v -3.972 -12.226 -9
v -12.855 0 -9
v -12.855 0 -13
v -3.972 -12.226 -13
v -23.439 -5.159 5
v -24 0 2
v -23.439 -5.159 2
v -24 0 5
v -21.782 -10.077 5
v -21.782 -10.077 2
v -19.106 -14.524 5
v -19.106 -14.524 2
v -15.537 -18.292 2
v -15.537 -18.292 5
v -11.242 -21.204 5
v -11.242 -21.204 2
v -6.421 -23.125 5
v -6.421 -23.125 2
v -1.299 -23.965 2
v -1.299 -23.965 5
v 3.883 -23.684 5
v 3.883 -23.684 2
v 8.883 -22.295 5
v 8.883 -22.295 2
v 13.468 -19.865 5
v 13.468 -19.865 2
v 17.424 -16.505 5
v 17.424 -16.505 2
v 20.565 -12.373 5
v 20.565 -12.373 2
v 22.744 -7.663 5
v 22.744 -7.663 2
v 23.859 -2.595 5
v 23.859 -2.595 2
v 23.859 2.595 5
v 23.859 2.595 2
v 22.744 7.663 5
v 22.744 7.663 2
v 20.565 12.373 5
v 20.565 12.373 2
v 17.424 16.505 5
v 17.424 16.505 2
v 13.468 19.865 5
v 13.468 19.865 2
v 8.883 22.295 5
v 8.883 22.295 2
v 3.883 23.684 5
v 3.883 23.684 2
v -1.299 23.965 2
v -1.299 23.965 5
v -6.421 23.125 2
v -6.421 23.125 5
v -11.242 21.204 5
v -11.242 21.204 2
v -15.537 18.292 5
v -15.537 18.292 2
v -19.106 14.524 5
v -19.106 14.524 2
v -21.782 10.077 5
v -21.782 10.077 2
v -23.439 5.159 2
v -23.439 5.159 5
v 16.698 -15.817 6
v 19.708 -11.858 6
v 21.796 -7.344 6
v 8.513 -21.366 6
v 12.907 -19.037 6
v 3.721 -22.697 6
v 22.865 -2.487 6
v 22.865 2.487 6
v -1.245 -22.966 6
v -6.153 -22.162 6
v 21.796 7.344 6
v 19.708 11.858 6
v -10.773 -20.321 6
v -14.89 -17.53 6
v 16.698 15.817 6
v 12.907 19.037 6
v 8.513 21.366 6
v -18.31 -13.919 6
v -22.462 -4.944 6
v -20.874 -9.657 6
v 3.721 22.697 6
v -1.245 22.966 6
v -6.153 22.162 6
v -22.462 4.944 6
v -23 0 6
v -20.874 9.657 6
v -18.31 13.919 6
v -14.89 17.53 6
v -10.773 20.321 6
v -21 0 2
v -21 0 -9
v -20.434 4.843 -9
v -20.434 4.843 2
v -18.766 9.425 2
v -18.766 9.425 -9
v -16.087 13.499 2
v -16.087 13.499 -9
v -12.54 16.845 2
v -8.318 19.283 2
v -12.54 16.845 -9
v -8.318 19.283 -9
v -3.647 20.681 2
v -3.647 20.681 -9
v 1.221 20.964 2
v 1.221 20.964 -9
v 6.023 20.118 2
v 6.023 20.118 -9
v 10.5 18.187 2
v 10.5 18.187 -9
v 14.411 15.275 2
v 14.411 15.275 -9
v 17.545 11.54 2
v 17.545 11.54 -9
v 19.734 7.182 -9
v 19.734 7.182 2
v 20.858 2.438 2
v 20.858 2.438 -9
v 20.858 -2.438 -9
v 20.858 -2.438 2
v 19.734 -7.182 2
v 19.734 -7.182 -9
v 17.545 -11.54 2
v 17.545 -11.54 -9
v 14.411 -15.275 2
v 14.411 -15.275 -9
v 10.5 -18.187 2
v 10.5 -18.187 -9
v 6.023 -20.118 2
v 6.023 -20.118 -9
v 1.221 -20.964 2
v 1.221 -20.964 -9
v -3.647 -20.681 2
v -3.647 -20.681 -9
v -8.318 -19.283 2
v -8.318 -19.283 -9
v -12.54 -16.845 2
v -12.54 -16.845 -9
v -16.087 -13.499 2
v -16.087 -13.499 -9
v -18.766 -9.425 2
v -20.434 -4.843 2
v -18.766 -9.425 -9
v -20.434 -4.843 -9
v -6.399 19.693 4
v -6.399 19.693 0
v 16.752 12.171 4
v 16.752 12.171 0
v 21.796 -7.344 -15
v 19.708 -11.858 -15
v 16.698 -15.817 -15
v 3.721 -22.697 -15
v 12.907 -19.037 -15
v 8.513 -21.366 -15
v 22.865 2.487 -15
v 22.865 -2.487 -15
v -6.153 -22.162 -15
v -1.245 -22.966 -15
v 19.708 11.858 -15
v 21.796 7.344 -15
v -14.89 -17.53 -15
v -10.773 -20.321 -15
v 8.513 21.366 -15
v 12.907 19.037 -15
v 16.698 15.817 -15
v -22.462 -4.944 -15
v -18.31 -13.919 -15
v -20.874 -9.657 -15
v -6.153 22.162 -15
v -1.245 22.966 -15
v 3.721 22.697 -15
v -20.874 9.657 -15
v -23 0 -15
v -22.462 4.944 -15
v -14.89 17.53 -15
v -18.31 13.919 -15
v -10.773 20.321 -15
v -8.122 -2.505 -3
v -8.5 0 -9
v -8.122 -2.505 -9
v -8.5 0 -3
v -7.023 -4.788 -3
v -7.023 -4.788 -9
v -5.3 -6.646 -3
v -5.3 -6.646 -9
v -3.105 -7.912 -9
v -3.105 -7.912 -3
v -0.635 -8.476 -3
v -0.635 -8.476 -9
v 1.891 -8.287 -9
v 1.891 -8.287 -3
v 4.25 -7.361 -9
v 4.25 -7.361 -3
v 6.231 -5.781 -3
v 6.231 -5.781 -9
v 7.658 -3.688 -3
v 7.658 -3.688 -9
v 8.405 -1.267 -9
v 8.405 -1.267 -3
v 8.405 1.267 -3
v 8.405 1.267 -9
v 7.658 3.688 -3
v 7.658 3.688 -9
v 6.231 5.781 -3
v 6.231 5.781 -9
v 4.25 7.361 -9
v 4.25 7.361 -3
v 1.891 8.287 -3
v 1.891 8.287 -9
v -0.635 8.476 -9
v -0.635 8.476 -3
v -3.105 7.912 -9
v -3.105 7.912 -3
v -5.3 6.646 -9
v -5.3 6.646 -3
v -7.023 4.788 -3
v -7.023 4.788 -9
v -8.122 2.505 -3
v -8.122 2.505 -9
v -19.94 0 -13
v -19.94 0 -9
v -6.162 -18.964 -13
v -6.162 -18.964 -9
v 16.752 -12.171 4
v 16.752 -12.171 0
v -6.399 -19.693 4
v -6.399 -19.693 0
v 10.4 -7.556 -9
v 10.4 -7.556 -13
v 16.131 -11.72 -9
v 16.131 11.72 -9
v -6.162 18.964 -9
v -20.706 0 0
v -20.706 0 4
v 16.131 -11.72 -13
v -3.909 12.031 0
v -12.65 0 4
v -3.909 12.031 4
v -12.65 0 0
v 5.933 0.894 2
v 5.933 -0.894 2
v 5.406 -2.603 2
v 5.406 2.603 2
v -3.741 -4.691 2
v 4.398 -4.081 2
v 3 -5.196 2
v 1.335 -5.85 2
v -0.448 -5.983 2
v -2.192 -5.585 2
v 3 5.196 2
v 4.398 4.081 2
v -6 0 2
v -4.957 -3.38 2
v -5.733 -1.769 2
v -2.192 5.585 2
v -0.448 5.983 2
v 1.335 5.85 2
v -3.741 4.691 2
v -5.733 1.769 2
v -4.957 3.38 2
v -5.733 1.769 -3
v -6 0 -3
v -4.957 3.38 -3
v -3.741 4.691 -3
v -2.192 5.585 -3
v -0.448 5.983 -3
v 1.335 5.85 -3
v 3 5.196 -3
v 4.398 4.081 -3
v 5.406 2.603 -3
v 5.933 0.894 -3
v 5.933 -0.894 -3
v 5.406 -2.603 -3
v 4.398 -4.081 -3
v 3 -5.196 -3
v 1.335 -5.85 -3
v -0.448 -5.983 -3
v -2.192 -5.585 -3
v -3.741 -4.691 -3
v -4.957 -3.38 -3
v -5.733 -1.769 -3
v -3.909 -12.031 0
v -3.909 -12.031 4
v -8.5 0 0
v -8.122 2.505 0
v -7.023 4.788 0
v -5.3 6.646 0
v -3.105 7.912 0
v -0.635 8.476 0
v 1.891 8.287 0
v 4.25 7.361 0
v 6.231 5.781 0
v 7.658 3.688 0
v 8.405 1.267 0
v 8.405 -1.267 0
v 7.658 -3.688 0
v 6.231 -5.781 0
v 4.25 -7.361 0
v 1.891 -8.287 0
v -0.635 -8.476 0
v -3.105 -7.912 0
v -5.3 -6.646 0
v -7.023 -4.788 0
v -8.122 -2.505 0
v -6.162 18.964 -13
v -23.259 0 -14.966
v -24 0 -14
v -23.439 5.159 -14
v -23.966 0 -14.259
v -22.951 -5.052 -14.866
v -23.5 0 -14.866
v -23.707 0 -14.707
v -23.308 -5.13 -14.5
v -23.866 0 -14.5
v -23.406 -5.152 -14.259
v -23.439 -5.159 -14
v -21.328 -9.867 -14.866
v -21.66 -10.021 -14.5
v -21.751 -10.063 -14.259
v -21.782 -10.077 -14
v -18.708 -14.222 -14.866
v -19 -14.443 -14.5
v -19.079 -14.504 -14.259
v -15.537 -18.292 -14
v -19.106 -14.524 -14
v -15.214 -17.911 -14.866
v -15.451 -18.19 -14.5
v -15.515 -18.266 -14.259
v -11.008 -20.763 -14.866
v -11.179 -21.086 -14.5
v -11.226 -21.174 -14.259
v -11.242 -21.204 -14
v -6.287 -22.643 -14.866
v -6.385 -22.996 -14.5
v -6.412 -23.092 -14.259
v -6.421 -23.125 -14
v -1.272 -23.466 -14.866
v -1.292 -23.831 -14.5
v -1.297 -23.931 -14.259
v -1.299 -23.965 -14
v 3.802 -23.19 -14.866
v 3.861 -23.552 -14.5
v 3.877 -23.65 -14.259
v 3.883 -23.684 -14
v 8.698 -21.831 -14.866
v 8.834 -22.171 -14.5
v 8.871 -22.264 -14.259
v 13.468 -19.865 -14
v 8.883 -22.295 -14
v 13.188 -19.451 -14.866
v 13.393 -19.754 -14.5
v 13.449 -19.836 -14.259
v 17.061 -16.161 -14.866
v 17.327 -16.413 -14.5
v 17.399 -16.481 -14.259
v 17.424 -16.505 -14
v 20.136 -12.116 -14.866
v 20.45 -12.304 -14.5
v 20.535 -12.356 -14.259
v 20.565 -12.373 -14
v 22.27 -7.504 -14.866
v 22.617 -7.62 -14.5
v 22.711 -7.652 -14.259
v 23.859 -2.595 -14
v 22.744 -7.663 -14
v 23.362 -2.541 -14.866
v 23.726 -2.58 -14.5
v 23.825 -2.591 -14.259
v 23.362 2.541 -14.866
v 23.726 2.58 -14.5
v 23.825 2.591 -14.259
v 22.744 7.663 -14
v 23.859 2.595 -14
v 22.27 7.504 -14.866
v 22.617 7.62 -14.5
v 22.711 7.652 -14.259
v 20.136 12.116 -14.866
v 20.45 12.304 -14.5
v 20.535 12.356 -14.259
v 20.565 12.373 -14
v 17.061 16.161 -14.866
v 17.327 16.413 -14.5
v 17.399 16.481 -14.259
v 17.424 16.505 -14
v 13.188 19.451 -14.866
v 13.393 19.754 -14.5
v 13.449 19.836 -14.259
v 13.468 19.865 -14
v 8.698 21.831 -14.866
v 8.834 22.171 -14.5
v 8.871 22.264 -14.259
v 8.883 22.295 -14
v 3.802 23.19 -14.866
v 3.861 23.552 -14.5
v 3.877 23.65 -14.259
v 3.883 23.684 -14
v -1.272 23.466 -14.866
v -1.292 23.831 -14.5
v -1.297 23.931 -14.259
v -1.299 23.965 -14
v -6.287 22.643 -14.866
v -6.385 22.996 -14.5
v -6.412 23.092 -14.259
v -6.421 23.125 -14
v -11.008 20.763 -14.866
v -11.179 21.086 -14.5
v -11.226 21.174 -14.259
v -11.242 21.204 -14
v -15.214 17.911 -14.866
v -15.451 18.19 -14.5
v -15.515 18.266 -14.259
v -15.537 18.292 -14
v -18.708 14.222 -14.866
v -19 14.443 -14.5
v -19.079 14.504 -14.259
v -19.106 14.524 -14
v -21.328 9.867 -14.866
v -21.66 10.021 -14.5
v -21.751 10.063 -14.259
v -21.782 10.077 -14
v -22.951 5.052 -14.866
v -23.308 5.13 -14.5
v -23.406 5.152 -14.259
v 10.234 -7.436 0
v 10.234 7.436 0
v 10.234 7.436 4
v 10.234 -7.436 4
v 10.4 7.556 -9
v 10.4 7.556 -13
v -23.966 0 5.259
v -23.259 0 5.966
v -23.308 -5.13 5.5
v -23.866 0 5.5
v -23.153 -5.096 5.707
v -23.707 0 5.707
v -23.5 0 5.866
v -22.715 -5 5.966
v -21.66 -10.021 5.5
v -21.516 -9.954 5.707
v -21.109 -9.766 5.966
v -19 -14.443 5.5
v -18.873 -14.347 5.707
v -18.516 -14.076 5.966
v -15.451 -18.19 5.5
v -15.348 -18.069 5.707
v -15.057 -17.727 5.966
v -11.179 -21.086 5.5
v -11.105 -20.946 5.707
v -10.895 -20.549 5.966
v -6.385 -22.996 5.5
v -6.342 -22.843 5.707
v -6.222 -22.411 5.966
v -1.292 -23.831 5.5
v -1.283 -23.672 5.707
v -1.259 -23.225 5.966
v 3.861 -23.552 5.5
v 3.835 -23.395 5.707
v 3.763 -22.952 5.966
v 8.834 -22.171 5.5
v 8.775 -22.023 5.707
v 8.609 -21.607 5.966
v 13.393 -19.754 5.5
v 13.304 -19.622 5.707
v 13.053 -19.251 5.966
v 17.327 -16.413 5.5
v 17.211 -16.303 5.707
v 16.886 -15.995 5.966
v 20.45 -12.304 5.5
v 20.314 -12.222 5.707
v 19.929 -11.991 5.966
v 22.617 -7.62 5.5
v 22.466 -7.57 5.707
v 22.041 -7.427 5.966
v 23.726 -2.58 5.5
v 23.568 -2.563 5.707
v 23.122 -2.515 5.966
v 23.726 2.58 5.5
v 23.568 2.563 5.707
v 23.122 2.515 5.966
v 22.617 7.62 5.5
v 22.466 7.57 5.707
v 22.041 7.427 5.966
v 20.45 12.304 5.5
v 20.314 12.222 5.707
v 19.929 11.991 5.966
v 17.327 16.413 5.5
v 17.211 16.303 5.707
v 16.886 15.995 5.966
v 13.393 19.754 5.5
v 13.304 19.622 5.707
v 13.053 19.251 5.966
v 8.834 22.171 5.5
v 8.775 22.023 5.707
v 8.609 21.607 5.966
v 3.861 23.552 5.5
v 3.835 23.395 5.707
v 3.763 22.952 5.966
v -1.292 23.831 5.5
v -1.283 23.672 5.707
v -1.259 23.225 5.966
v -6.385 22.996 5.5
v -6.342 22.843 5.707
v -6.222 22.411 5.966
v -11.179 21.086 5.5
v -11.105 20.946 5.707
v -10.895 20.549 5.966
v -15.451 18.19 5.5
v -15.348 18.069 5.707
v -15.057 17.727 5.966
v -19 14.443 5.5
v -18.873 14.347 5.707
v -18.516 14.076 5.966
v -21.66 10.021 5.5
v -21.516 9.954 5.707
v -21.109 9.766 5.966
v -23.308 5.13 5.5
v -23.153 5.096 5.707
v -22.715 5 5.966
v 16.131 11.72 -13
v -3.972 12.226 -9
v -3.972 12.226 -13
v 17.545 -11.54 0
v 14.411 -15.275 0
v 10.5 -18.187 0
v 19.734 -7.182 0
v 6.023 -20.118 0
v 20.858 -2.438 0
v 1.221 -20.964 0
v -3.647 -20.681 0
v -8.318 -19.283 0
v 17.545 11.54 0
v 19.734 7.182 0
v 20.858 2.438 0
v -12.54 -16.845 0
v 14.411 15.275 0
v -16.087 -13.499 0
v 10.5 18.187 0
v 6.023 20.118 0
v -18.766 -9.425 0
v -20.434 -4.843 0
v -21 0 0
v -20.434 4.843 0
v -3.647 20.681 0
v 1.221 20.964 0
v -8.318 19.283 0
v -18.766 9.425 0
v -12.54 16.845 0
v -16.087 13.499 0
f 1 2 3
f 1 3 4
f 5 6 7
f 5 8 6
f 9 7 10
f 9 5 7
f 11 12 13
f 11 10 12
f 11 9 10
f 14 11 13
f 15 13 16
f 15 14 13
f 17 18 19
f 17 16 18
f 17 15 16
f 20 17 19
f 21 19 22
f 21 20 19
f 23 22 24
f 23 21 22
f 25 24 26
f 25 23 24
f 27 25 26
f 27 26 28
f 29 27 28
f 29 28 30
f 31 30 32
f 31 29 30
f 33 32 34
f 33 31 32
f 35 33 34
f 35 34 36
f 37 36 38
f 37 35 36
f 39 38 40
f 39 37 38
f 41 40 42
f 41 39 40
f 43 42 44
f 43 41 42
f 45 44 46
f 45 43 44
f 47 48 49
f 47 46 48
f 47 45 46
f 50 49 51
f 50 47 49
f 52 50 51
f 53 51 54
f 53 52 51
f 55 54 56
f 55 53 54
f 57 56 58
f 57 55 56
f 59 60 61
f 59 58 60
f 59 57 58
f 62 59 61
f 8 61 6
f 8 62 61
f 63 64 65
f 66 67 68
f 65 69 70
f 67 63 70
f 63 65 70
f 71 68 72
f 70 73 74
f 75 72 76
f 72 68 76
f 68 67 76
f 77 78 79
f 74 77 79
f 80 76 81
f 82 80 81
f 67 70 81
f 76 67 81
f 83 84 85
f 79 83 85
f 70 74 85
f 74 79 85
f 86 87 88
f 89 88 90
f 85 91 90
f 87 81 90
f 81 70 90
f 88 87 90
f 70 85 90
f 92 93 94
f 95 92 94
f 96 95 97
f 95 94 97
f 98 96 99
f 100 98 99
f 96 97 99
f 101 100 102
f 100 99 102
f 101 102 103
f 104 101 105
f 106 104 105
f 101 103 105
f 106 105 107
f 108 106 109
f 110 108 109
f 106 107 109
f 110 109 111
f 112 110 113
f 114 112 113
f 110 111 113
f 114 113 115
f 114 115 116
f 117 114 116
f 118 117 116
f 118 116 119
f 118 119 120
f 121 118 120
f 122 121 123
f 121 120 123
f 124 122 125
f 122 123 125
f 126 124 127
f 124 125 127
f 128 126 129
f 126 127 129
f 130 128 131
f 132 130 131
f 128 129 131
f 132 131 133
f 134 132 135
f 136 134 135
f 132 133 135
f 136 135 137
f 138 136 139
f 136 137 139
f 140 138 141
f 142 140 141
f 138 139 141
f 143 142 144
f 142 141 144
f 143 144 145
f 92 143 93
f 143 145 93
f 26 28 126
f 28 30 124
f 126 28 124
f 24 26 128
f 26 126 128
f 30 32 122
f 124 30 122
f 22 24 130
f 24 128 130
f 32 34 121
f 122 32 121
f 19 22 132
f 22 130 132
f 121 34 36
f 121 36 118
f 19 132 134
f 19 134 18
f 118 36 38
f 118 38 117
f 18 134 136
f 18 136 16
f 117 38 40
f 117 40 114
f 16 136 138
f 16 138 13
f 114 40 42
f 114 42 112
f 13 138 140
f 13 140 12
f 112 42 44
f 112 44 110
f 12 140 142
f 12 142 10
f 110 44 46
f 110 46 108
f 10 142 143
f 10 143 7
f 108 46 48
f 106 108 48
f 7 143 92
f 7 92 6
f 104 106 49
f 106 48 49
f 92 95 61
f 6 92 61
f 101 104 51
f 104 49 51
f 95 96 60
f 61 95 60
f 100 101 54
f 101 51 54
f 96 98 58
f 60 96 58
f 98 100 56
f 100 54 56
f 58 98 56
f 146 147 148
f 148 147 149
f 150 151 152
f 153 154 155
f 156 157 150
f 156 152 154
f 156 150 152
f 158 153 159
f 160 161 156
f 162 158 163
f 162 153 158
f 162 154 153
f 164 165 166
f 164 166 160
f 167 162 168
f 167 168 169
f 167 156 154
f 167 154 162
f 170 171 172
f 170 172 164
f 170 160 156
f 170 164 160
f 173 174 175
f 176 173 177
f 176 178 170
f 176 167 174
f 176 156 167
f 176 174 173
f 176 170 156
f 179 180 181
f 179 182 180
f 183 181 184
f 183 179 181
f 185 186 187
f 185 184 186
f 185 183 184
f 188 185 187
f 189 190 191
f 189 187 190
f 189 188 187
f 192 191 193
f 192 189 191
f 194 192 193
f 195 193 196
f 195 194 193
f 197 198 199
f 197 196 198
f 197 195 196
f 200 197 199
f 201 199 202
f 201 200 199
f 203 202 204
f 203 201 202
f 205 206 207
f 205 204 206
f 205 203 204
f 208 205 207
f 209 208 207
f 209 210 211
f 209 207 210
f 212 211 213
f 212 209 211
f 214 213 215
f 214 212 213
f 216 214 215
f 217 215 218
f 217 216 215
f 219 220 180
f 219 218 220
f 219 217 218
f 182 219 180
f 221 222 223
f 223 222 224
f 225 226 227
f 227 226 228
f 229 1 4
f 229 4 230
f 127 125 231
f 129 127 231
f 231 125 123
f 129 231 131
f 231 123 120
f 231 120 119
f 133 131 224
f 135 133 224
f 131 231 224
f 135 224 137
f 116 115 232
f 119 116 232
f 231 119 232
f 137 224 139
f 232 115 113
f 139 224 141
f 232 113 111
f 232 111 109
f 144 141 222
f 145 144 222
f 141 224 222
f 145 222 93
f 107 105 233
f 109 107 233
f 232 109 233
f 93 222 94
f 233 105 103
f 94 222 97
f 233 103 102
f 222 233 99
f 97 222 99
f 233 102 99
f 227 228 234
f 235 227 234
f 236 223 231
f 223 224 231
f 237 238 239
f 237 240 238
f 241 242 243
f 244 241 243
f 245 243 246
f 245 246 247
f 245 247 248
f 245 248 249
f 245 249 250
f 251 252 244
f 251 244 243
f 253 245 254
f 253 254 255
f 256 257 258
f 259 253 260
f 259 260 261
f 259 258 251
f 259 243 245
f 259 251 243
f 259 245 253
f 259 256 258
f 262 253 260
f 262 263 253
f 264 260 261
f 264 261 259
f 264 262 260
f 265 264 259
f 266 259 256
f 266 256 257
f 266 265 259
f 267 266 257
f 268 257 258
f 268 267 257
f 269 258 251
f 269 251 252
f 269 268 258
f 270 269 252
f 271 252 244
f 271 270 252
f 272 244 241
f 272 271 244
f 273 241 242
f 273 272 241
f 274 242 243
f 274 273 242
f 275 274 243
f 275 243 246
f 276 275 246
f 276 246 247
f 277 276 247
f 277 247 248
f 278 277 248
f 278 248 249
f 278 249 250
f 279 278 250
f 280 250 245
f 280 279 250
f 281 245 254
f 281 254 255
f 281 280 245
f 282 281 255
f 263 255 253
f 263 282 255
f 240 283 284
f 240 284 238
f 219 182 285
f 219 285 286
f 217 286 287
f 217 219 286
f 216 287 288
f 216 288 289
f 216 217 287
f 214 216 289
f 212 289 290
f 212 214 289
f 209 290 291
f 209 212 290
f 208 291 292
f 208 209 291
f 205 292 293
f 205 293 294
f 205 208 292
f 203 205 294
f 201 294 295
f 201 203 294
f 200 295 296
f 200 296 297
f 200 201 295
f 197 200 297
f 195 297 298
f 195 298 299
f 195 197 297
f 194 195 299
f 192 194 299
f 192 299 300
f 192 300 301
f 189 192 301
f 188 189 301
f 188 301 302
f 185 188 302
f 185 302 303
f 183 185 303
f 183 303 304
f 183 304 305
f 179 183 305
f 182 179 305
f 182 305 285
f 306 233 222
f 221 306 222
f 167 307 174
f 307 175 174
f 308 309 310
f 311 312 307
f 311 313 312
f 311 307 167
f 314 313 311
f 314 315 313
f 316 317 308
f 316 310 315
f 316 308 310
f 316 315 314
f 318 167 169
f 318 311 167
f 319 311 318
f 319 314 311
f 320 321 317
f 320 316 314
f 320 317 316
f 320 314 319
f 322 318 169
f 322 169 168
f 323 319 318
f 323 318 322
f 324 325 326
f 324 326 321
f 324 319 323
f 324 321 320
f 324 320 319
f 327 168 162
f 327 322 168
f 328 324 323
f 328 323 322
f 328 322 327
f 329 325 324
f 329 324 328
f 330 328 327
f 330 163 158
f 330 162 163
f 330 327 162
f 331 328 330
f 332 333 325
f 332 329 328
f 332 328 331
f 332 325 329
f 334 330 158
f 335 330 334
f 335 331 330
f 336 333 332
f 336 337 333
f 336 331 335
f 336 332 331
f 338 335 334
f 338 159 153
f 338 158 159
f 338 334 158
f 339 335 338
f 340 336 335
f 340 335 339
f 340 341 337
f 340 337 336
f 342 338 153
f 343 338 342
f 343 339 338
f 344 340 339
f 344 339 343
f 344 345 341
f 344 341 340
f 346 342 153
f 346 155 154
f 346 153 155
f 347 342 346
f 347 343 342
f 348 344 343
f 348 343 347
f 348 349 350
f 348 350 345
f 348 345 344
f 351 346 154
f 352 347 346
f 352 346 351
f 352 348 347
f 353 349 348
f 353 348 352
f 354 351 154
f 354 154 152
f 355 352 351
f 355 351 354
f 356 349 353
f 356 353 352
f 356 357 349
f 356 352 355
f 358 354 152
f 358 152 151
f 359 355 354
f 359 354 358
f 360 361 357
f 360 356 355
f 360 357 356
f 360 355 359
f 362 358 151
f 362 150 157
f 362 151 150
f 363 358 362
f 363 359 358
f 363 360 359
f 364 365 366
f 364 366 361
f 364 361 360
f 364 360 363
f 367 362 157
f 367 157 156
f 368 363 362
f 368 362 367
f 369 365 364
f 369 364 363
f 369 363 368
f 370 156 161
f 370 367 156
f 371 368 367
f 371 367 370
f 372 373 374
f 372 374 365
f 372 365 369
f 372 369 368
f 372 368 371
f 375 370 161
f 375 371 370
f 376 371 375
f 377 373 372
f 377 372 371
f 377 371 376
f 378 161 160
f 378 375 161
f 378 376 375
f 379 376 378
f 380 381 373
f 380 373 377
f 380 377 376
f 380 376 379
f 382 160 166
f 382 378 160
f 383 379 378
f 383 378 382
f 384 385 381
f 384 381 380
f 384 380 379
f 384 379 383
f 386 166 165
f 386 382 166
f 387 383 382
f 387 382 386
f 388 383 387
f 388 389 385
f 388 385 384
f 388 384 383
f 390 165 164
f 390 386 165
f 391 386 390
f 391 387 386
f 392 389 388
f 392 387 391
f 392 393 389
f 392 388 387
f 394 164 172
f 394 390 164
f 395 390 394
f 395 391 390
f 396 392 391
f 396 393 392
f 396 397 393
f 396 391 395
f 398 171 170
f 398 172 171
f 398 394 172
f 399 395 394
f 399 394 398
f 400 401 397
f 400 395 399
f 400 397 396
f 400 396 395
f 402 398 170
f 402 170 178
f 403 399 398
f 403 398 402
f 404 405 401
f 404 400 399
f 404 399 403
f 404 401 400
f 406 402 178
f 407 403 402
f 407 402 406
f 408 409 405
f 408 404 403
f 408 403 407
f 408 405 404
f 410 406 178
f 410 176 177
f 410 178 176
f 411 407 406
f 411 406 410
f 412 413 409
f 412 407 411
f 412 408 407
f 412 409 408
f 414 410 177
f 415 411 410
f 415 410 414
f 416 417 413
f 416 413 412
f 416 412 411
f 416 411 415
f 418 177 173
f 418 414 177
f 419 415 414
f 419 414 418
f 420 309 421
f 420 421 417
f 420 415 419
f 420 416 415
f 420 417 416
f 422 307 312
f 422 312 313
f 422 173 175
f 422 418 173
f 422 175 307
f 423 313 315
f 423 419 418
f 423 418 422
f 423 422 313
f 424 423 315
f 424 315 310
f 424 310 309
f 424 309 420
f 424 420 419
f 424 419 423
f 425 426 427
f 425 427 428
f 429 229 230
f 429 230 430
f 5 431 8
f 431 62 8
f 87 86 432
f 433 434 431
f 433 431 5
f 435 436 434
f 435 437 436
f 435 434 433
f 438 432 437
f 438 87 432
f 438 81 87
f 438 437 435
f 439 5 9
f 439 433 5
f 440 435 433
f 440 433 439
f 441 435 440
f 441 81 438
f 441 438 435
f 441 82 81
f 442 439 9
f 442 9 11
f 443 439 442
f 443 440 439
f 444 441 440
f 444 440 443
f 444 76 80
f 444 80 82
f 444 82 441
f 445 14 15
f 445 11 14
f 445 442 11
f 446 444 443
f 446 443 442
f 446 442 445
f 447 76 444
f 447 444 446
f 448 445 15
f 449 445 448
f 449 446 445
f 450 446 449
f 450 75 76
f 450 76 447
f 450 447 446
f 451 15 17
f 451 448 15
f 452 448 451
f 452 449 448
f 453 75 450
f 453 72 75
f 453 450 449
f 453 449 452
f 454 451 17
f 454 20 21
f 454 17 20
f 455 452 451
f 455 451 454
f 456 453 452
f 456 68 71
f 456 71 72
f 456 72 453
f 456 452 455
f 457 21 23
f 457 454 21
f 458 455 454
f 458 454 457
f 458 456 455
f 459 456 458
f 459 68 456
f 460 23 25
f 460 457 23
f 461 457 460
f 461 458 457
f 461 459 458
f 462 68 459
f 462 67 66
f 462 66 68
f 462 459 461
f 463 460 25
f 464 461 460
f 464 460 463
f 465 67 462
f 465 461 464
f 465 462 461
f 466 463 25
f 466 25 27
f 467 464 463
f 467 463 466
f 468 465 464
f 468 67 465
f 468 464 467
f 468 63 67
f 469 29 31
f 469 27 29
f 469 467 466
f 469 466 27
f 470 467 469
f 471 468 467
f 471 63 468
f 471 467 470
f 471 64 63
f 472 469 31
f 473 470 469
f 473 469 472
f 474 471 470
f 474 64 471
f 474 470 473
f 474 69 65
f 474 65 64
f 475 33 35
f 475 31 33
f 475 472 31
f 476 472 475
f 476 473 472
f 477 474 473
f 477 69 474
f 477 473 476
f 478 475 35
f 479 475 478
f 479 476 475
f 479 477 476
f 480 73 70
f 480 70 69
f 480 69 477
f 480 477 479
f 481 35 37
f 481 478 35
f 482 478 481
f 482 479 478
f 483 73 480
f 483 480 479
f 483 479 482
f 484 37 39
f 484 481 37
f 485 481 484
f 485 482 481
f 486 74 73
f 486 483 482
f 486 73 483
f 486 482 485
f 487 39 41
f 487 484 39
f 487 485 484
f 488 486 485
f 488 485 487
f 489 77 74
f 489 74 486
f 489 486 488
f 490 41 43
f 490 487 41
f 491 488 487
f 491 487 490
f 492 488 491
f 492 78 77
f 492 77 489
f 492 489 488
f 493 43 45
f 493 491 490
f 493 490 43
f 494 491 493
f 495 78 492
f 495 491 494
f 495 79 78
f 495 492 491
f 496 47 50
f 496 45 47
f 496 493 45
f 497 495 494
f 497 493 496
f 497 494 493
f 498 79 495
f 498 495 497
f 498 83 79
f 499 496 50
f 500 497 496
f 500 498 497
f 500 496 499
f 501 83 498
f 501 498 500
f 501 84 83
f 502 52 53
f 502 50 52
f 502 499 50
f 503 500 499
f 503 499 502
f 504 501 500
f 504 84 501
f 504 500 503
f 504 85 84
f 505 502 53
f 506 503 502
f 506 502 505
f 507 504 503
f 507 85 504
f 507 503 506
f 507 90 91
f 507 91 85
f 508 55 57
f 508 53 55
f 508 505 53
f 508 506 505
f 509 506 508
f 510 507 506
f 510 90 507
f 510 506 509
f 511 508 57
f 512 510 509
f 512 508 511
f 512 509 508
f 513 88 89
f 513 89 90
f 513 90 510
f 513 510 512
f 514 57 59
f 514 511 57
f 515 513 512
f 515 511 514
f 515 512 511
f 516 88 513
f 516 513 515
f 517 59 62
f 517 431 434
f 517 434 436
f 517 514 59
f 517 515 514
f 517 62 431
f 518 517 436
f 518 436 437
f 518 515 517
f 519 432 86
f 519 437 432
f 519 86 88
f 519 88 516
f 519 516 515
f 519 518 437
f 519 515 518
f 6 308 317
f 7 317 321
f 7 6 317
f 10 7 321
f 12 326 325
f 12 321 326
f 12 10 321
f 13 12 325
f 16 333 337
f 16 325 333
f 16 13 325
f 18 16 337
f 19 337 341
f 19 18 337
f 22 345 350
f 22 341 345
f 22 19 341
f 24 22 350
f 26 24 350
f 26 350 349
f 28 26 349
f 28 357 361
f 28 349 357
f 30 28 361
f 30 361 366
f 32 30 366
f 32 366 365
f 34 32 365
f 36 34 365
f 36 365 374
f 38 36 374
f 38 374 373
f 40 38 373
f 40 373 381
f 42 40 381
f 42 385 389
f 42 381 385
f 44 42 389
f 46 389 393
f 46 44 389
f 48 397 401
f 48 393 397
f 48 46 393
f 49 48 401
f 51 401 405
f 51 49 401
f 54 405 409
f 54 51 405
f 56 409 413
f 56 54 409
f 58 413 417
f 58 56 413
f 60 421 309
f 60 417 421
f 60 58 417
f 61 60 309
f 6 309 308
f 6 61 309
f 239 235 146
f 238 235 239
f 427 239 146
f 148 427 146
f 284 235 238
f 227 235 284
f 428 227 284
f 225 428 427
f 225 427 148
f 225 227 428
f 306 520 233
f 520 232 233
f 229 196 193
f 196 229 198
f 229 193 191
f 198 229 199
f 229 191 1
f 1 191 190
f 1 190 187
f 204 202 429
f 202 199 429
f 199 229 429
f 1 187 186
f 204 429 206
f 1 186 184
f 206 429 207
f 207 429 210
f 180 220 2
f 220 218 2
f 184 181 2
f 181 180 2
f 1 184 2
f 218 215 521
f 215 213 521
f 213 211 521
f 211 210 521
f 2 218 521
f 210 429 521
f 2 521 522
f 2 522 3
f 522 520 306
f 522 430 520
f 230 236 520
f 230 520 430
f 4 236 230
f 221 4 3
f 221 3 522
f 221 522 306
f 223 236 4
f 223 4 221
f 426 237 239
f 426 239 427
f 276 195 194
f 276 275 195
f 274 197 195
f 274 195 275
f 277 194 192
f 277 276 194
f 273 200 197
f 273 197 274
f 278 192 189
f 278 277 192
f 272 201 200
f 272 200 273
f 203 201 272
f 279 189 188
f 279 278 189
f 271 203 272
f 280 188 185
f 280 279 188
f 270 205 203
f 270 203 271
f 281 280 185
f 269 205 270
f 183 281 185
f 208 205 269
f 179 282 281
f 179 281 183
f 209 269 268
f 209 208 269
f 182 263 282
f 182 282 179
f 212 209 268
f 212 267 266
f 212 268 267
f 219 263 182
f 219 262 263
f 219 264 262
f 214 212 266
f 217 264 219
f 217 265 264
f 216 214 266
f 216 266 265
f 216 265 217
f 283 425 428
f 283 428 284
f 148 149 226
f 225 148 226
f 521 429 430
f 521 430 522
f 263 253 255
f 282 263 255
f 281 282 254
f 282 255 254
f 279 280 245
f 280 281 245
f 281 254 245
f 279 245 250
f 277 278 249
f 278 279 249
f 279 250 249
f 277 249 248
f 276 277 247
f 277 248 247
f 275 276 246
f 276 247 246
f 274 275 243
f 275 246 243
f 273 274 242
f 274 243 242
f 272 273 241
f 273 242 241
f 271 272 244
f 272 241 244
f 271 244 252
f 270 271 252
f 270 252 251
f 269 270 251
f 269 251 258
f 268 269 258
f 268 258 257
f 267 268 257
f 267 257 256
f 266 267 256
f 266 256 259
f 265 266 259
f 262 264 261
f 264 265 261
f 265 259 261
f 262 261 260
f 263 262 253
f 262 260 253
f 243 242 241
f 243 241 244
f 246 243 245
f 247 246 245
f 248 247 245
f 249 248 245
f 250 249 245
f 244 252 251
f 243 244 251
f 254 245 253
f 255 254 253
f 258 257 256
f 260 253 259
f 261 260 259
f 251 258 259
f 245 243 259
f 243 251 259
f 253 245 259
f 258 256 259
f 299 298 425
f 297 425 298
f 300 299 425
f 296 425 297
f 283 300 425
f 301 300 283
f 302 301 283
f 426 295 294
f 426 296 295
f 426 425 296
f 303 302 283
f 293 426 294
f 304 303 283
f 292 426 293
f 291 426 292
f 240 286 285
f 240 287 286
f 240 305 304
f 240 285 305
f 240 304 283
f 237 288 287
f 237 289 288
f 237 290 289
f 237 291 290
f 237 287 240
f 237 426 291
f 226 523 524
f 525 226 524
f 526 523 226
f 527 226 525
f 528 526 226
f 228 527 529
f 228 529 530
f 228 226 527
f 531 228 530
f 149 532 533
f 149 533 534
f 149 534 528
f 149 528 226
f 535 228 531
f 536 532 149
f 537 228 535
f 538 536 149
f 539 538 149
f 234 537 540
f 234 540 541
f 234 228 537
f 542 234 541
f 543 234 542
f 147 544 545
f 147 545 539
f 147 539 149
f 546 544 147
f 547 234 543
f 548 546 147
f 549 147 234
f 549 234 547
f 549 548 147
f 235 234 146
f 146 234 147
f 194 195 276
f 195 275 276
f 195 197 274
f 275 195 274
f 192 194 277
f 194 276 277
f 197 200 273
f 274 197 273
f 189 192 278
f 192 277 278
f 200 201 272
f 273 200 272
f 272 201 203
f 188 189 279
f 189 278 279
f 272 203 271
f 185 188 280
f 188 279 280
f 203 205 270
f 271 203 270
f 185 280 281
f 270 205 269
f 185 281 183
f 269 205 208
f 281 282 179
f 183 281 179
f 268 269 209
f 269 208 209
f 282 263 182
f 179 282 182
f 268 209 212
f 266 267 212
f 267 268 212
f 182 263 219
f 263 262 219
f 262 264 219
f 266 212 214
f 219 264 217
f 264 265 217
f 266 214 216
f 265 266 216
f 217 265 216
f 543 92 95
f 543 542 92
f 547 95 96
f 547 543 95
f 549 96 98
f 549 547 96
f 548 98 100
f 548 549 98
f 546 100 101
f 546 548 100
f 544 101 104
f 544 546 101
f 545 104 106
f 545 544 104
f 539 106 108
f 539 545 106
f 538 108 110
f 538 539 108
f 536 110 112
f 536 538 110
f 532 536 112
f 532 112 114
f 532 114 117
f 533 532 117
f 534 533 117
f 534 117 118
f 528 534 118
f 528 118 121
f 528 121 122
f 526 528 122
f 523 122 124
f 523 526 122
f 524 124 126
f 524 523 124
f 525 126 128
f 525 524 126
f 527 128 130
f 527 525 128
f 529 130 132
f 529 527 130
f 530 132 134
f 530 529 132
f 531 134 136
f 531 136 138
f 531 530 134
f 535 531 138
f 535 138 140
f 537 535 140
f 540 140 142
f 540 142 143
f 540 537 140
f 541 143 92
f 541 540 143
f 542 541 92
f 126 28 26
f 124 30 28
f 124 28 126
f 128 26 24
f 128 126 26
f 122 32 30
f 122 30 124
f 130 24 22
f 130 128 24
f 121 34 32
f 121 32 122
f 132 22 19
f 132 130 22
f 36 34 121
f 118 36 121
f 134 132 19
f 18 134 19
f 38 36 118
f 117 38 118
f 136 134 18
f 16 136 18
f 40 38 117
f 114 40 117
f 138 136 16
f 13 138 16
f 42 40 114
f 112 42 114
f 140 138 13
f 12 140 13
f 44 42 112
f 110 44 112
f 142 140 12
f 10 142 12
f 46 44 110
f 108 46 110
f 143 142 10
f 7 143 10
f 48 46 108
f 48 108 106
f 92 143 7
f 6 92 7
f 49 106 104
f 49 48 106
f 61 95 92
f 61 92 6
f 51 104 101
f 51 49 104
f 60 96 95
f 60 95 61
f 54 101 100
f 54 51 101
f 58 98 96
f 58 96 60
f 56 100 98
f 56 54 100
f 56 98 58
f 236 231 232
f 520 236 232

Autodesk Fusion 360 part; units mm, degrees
sketch "Sketch1" plane through (0, 0, 0) normal (0, 1, 0) x (1, 0, 0)
  line L0 (0, -45) -> (0, 23.1854)
  line L1 (0, 15) -> (-23, 15)
  line L2 (-24, 14) -> (-24, -2)
  line L3 (0, -2) -> (0, 15)
  arc A0 (-23, 15) -> (-24, 14) centre (-23, 14) ccw
  line L4 (-21, 9) -> (-8.5, 9)
  line L5 (-8.5, 9) -> (-8.5, 3)
  line L6 (-21, 0) -> (-21, 9)
  line L7 (-21, 0) -> (-21, -2)
  line L8 (-24, -2) -> (-21, -2)
  line L9 (-6, 3) -> (-8.5, 3)
  line L10 (0, -2) -> (-6, -2)
  line L11 (-6, -2) -> (-6, 3)
  line L12 (0, 3) -> (0, -2)
  dimension "d2" = 17
  dimension "d3" = 1
  dimension "d4" = 12.5
  dimension "d5" = 9
revolve "Revolve1" add sketch "Sketch1" angle 360 about axis through (0, 0, 45) along (0, 0, -1) makes body 1
sketch "Sketch2" plane through (0, 0, -9) normal (0, 0, 1) x (-1, 0, 0)
  circle A0 centre (0, 0) radius 8.5
  circle A1 centre (0, 0) radius 21
  line L0 (19.9396, 0) -> (6.1617, 18.9637)
  line L1 (6.1617, 18.9637) -> (-16.1315, 11.7202)
  line L2 (-16.1315, 11.7202) -> (-16.1315, -11.7202)
  line L3 (-16.1315, -11.7202) -> (6.1617, -18.9637)
  line L4 (6.1617, -18.9637) -> (19.9396, 0)
  line L5 (12.8552, 0) -> (3.9725, 12.2261)
  line L6 (3.9725, 12.2261) -> (-10.4001, 7.5561)
  line L7 (-10.4001, 7.5561) -> (-10.4001, -7.5561)
  line L8 (-10.4001, -7.5561) -> (3.9725, -12.2261)
  line L9 (3.9725, -12.2261) -> (12.8552, 0)
extrude "Extrude1" cut sketch "Sketch2" against normal blind 4 contours L0 L1 L2 L3 L4 bodies 1
copy_body "Body->Comp1" bodies 1 removing the originals makes body 2 in component "Component"
sketch "Sketch1 (2)" plane through (0, 0, 0) normal (0, 1, 0) x (1, 0, 0) in component "Component'"
  line L0 (0, -11) -> (0, 18)
  line L1 (-24, -2) -> (-21, -2)
  line L2 (-21, -2) -> (-21, 0)
  line L3 (-21, 0) -> (-8.5, 0)
  line L4 (-8.5, 0) -> (-8.5, 3)
  line L5 (-6, 3) -> (-6, -2)
  line L6 (-6, -2) -> (0, -2)
  line L7 (-24, -2) -> (-24, -5)
  line L8 (-23, -6) -> (0, -6)
  line L9 (0, -2) -> (0, -6)
  line L10 (-6, 3) -> (-8.5, 3)
  arc A0 (-24, -5) -> (-23, -6) centre (-23, -5) ccw
  dimension "d9" = 12.5
  dimension "d10" = 1
revolve "Revolve1'" add sketch "Sketch1 (2)" angle 360 about axis through (0, 0, 11) along (0, 0, -1) separate body makes body 3 in component "Component'"
sketch "Sketch2 (2)" plane through (0, 0, 0) normal (0, 0, -1) x (1, 0, 0) in component "Component'"
  circle A0 centre (0, 0) radius 21
  circle A1 centre (0, 0) radius 8.5
  line L0 (-20.7065, 0) -> (-6.3986, -19.693)
  line L1 (-6.3986, -19.693) -> (16.7519, -12.1709)
  line L2 (16.7519, -12.1709) -> (16.7519, 12.1709)
  line L3 (16.7519, 12.1709) -> (-6.3986, 19.693)
  line L4 (-6.3986, 19.693) -> (-20.7065, 0)
  line L5 (-12.6501, 0) -> (-3.9091, -12.0309)
  line L6 (-3.9091, -12.0309) -> (10.2341, -7.4355)
  line L7 (10.2341, -7.4355) -> (10.2341, 7.4355)
  line L8 (10.2341, 7.4355) -> (-3.9091, 12.0309)
  line L9 (-3.9091, 12.0309) -> (-12.6501, 0)
extrude "Extrude1'" cut sketch "Sketch2 (2)" against normal blind 4 contours L0 L1 L2 L3 L4 bodies 3 in component "Component'"
component "Component" placed x (1, 0, 0) y (0, 1, 0) z (0, 0, 1) at (0, 0, 0)
component "Component'" placed x (1, 0, 0) y (0, 1, 0) z (0, 0, 1) at (0, 0, 0) in component "Component"
